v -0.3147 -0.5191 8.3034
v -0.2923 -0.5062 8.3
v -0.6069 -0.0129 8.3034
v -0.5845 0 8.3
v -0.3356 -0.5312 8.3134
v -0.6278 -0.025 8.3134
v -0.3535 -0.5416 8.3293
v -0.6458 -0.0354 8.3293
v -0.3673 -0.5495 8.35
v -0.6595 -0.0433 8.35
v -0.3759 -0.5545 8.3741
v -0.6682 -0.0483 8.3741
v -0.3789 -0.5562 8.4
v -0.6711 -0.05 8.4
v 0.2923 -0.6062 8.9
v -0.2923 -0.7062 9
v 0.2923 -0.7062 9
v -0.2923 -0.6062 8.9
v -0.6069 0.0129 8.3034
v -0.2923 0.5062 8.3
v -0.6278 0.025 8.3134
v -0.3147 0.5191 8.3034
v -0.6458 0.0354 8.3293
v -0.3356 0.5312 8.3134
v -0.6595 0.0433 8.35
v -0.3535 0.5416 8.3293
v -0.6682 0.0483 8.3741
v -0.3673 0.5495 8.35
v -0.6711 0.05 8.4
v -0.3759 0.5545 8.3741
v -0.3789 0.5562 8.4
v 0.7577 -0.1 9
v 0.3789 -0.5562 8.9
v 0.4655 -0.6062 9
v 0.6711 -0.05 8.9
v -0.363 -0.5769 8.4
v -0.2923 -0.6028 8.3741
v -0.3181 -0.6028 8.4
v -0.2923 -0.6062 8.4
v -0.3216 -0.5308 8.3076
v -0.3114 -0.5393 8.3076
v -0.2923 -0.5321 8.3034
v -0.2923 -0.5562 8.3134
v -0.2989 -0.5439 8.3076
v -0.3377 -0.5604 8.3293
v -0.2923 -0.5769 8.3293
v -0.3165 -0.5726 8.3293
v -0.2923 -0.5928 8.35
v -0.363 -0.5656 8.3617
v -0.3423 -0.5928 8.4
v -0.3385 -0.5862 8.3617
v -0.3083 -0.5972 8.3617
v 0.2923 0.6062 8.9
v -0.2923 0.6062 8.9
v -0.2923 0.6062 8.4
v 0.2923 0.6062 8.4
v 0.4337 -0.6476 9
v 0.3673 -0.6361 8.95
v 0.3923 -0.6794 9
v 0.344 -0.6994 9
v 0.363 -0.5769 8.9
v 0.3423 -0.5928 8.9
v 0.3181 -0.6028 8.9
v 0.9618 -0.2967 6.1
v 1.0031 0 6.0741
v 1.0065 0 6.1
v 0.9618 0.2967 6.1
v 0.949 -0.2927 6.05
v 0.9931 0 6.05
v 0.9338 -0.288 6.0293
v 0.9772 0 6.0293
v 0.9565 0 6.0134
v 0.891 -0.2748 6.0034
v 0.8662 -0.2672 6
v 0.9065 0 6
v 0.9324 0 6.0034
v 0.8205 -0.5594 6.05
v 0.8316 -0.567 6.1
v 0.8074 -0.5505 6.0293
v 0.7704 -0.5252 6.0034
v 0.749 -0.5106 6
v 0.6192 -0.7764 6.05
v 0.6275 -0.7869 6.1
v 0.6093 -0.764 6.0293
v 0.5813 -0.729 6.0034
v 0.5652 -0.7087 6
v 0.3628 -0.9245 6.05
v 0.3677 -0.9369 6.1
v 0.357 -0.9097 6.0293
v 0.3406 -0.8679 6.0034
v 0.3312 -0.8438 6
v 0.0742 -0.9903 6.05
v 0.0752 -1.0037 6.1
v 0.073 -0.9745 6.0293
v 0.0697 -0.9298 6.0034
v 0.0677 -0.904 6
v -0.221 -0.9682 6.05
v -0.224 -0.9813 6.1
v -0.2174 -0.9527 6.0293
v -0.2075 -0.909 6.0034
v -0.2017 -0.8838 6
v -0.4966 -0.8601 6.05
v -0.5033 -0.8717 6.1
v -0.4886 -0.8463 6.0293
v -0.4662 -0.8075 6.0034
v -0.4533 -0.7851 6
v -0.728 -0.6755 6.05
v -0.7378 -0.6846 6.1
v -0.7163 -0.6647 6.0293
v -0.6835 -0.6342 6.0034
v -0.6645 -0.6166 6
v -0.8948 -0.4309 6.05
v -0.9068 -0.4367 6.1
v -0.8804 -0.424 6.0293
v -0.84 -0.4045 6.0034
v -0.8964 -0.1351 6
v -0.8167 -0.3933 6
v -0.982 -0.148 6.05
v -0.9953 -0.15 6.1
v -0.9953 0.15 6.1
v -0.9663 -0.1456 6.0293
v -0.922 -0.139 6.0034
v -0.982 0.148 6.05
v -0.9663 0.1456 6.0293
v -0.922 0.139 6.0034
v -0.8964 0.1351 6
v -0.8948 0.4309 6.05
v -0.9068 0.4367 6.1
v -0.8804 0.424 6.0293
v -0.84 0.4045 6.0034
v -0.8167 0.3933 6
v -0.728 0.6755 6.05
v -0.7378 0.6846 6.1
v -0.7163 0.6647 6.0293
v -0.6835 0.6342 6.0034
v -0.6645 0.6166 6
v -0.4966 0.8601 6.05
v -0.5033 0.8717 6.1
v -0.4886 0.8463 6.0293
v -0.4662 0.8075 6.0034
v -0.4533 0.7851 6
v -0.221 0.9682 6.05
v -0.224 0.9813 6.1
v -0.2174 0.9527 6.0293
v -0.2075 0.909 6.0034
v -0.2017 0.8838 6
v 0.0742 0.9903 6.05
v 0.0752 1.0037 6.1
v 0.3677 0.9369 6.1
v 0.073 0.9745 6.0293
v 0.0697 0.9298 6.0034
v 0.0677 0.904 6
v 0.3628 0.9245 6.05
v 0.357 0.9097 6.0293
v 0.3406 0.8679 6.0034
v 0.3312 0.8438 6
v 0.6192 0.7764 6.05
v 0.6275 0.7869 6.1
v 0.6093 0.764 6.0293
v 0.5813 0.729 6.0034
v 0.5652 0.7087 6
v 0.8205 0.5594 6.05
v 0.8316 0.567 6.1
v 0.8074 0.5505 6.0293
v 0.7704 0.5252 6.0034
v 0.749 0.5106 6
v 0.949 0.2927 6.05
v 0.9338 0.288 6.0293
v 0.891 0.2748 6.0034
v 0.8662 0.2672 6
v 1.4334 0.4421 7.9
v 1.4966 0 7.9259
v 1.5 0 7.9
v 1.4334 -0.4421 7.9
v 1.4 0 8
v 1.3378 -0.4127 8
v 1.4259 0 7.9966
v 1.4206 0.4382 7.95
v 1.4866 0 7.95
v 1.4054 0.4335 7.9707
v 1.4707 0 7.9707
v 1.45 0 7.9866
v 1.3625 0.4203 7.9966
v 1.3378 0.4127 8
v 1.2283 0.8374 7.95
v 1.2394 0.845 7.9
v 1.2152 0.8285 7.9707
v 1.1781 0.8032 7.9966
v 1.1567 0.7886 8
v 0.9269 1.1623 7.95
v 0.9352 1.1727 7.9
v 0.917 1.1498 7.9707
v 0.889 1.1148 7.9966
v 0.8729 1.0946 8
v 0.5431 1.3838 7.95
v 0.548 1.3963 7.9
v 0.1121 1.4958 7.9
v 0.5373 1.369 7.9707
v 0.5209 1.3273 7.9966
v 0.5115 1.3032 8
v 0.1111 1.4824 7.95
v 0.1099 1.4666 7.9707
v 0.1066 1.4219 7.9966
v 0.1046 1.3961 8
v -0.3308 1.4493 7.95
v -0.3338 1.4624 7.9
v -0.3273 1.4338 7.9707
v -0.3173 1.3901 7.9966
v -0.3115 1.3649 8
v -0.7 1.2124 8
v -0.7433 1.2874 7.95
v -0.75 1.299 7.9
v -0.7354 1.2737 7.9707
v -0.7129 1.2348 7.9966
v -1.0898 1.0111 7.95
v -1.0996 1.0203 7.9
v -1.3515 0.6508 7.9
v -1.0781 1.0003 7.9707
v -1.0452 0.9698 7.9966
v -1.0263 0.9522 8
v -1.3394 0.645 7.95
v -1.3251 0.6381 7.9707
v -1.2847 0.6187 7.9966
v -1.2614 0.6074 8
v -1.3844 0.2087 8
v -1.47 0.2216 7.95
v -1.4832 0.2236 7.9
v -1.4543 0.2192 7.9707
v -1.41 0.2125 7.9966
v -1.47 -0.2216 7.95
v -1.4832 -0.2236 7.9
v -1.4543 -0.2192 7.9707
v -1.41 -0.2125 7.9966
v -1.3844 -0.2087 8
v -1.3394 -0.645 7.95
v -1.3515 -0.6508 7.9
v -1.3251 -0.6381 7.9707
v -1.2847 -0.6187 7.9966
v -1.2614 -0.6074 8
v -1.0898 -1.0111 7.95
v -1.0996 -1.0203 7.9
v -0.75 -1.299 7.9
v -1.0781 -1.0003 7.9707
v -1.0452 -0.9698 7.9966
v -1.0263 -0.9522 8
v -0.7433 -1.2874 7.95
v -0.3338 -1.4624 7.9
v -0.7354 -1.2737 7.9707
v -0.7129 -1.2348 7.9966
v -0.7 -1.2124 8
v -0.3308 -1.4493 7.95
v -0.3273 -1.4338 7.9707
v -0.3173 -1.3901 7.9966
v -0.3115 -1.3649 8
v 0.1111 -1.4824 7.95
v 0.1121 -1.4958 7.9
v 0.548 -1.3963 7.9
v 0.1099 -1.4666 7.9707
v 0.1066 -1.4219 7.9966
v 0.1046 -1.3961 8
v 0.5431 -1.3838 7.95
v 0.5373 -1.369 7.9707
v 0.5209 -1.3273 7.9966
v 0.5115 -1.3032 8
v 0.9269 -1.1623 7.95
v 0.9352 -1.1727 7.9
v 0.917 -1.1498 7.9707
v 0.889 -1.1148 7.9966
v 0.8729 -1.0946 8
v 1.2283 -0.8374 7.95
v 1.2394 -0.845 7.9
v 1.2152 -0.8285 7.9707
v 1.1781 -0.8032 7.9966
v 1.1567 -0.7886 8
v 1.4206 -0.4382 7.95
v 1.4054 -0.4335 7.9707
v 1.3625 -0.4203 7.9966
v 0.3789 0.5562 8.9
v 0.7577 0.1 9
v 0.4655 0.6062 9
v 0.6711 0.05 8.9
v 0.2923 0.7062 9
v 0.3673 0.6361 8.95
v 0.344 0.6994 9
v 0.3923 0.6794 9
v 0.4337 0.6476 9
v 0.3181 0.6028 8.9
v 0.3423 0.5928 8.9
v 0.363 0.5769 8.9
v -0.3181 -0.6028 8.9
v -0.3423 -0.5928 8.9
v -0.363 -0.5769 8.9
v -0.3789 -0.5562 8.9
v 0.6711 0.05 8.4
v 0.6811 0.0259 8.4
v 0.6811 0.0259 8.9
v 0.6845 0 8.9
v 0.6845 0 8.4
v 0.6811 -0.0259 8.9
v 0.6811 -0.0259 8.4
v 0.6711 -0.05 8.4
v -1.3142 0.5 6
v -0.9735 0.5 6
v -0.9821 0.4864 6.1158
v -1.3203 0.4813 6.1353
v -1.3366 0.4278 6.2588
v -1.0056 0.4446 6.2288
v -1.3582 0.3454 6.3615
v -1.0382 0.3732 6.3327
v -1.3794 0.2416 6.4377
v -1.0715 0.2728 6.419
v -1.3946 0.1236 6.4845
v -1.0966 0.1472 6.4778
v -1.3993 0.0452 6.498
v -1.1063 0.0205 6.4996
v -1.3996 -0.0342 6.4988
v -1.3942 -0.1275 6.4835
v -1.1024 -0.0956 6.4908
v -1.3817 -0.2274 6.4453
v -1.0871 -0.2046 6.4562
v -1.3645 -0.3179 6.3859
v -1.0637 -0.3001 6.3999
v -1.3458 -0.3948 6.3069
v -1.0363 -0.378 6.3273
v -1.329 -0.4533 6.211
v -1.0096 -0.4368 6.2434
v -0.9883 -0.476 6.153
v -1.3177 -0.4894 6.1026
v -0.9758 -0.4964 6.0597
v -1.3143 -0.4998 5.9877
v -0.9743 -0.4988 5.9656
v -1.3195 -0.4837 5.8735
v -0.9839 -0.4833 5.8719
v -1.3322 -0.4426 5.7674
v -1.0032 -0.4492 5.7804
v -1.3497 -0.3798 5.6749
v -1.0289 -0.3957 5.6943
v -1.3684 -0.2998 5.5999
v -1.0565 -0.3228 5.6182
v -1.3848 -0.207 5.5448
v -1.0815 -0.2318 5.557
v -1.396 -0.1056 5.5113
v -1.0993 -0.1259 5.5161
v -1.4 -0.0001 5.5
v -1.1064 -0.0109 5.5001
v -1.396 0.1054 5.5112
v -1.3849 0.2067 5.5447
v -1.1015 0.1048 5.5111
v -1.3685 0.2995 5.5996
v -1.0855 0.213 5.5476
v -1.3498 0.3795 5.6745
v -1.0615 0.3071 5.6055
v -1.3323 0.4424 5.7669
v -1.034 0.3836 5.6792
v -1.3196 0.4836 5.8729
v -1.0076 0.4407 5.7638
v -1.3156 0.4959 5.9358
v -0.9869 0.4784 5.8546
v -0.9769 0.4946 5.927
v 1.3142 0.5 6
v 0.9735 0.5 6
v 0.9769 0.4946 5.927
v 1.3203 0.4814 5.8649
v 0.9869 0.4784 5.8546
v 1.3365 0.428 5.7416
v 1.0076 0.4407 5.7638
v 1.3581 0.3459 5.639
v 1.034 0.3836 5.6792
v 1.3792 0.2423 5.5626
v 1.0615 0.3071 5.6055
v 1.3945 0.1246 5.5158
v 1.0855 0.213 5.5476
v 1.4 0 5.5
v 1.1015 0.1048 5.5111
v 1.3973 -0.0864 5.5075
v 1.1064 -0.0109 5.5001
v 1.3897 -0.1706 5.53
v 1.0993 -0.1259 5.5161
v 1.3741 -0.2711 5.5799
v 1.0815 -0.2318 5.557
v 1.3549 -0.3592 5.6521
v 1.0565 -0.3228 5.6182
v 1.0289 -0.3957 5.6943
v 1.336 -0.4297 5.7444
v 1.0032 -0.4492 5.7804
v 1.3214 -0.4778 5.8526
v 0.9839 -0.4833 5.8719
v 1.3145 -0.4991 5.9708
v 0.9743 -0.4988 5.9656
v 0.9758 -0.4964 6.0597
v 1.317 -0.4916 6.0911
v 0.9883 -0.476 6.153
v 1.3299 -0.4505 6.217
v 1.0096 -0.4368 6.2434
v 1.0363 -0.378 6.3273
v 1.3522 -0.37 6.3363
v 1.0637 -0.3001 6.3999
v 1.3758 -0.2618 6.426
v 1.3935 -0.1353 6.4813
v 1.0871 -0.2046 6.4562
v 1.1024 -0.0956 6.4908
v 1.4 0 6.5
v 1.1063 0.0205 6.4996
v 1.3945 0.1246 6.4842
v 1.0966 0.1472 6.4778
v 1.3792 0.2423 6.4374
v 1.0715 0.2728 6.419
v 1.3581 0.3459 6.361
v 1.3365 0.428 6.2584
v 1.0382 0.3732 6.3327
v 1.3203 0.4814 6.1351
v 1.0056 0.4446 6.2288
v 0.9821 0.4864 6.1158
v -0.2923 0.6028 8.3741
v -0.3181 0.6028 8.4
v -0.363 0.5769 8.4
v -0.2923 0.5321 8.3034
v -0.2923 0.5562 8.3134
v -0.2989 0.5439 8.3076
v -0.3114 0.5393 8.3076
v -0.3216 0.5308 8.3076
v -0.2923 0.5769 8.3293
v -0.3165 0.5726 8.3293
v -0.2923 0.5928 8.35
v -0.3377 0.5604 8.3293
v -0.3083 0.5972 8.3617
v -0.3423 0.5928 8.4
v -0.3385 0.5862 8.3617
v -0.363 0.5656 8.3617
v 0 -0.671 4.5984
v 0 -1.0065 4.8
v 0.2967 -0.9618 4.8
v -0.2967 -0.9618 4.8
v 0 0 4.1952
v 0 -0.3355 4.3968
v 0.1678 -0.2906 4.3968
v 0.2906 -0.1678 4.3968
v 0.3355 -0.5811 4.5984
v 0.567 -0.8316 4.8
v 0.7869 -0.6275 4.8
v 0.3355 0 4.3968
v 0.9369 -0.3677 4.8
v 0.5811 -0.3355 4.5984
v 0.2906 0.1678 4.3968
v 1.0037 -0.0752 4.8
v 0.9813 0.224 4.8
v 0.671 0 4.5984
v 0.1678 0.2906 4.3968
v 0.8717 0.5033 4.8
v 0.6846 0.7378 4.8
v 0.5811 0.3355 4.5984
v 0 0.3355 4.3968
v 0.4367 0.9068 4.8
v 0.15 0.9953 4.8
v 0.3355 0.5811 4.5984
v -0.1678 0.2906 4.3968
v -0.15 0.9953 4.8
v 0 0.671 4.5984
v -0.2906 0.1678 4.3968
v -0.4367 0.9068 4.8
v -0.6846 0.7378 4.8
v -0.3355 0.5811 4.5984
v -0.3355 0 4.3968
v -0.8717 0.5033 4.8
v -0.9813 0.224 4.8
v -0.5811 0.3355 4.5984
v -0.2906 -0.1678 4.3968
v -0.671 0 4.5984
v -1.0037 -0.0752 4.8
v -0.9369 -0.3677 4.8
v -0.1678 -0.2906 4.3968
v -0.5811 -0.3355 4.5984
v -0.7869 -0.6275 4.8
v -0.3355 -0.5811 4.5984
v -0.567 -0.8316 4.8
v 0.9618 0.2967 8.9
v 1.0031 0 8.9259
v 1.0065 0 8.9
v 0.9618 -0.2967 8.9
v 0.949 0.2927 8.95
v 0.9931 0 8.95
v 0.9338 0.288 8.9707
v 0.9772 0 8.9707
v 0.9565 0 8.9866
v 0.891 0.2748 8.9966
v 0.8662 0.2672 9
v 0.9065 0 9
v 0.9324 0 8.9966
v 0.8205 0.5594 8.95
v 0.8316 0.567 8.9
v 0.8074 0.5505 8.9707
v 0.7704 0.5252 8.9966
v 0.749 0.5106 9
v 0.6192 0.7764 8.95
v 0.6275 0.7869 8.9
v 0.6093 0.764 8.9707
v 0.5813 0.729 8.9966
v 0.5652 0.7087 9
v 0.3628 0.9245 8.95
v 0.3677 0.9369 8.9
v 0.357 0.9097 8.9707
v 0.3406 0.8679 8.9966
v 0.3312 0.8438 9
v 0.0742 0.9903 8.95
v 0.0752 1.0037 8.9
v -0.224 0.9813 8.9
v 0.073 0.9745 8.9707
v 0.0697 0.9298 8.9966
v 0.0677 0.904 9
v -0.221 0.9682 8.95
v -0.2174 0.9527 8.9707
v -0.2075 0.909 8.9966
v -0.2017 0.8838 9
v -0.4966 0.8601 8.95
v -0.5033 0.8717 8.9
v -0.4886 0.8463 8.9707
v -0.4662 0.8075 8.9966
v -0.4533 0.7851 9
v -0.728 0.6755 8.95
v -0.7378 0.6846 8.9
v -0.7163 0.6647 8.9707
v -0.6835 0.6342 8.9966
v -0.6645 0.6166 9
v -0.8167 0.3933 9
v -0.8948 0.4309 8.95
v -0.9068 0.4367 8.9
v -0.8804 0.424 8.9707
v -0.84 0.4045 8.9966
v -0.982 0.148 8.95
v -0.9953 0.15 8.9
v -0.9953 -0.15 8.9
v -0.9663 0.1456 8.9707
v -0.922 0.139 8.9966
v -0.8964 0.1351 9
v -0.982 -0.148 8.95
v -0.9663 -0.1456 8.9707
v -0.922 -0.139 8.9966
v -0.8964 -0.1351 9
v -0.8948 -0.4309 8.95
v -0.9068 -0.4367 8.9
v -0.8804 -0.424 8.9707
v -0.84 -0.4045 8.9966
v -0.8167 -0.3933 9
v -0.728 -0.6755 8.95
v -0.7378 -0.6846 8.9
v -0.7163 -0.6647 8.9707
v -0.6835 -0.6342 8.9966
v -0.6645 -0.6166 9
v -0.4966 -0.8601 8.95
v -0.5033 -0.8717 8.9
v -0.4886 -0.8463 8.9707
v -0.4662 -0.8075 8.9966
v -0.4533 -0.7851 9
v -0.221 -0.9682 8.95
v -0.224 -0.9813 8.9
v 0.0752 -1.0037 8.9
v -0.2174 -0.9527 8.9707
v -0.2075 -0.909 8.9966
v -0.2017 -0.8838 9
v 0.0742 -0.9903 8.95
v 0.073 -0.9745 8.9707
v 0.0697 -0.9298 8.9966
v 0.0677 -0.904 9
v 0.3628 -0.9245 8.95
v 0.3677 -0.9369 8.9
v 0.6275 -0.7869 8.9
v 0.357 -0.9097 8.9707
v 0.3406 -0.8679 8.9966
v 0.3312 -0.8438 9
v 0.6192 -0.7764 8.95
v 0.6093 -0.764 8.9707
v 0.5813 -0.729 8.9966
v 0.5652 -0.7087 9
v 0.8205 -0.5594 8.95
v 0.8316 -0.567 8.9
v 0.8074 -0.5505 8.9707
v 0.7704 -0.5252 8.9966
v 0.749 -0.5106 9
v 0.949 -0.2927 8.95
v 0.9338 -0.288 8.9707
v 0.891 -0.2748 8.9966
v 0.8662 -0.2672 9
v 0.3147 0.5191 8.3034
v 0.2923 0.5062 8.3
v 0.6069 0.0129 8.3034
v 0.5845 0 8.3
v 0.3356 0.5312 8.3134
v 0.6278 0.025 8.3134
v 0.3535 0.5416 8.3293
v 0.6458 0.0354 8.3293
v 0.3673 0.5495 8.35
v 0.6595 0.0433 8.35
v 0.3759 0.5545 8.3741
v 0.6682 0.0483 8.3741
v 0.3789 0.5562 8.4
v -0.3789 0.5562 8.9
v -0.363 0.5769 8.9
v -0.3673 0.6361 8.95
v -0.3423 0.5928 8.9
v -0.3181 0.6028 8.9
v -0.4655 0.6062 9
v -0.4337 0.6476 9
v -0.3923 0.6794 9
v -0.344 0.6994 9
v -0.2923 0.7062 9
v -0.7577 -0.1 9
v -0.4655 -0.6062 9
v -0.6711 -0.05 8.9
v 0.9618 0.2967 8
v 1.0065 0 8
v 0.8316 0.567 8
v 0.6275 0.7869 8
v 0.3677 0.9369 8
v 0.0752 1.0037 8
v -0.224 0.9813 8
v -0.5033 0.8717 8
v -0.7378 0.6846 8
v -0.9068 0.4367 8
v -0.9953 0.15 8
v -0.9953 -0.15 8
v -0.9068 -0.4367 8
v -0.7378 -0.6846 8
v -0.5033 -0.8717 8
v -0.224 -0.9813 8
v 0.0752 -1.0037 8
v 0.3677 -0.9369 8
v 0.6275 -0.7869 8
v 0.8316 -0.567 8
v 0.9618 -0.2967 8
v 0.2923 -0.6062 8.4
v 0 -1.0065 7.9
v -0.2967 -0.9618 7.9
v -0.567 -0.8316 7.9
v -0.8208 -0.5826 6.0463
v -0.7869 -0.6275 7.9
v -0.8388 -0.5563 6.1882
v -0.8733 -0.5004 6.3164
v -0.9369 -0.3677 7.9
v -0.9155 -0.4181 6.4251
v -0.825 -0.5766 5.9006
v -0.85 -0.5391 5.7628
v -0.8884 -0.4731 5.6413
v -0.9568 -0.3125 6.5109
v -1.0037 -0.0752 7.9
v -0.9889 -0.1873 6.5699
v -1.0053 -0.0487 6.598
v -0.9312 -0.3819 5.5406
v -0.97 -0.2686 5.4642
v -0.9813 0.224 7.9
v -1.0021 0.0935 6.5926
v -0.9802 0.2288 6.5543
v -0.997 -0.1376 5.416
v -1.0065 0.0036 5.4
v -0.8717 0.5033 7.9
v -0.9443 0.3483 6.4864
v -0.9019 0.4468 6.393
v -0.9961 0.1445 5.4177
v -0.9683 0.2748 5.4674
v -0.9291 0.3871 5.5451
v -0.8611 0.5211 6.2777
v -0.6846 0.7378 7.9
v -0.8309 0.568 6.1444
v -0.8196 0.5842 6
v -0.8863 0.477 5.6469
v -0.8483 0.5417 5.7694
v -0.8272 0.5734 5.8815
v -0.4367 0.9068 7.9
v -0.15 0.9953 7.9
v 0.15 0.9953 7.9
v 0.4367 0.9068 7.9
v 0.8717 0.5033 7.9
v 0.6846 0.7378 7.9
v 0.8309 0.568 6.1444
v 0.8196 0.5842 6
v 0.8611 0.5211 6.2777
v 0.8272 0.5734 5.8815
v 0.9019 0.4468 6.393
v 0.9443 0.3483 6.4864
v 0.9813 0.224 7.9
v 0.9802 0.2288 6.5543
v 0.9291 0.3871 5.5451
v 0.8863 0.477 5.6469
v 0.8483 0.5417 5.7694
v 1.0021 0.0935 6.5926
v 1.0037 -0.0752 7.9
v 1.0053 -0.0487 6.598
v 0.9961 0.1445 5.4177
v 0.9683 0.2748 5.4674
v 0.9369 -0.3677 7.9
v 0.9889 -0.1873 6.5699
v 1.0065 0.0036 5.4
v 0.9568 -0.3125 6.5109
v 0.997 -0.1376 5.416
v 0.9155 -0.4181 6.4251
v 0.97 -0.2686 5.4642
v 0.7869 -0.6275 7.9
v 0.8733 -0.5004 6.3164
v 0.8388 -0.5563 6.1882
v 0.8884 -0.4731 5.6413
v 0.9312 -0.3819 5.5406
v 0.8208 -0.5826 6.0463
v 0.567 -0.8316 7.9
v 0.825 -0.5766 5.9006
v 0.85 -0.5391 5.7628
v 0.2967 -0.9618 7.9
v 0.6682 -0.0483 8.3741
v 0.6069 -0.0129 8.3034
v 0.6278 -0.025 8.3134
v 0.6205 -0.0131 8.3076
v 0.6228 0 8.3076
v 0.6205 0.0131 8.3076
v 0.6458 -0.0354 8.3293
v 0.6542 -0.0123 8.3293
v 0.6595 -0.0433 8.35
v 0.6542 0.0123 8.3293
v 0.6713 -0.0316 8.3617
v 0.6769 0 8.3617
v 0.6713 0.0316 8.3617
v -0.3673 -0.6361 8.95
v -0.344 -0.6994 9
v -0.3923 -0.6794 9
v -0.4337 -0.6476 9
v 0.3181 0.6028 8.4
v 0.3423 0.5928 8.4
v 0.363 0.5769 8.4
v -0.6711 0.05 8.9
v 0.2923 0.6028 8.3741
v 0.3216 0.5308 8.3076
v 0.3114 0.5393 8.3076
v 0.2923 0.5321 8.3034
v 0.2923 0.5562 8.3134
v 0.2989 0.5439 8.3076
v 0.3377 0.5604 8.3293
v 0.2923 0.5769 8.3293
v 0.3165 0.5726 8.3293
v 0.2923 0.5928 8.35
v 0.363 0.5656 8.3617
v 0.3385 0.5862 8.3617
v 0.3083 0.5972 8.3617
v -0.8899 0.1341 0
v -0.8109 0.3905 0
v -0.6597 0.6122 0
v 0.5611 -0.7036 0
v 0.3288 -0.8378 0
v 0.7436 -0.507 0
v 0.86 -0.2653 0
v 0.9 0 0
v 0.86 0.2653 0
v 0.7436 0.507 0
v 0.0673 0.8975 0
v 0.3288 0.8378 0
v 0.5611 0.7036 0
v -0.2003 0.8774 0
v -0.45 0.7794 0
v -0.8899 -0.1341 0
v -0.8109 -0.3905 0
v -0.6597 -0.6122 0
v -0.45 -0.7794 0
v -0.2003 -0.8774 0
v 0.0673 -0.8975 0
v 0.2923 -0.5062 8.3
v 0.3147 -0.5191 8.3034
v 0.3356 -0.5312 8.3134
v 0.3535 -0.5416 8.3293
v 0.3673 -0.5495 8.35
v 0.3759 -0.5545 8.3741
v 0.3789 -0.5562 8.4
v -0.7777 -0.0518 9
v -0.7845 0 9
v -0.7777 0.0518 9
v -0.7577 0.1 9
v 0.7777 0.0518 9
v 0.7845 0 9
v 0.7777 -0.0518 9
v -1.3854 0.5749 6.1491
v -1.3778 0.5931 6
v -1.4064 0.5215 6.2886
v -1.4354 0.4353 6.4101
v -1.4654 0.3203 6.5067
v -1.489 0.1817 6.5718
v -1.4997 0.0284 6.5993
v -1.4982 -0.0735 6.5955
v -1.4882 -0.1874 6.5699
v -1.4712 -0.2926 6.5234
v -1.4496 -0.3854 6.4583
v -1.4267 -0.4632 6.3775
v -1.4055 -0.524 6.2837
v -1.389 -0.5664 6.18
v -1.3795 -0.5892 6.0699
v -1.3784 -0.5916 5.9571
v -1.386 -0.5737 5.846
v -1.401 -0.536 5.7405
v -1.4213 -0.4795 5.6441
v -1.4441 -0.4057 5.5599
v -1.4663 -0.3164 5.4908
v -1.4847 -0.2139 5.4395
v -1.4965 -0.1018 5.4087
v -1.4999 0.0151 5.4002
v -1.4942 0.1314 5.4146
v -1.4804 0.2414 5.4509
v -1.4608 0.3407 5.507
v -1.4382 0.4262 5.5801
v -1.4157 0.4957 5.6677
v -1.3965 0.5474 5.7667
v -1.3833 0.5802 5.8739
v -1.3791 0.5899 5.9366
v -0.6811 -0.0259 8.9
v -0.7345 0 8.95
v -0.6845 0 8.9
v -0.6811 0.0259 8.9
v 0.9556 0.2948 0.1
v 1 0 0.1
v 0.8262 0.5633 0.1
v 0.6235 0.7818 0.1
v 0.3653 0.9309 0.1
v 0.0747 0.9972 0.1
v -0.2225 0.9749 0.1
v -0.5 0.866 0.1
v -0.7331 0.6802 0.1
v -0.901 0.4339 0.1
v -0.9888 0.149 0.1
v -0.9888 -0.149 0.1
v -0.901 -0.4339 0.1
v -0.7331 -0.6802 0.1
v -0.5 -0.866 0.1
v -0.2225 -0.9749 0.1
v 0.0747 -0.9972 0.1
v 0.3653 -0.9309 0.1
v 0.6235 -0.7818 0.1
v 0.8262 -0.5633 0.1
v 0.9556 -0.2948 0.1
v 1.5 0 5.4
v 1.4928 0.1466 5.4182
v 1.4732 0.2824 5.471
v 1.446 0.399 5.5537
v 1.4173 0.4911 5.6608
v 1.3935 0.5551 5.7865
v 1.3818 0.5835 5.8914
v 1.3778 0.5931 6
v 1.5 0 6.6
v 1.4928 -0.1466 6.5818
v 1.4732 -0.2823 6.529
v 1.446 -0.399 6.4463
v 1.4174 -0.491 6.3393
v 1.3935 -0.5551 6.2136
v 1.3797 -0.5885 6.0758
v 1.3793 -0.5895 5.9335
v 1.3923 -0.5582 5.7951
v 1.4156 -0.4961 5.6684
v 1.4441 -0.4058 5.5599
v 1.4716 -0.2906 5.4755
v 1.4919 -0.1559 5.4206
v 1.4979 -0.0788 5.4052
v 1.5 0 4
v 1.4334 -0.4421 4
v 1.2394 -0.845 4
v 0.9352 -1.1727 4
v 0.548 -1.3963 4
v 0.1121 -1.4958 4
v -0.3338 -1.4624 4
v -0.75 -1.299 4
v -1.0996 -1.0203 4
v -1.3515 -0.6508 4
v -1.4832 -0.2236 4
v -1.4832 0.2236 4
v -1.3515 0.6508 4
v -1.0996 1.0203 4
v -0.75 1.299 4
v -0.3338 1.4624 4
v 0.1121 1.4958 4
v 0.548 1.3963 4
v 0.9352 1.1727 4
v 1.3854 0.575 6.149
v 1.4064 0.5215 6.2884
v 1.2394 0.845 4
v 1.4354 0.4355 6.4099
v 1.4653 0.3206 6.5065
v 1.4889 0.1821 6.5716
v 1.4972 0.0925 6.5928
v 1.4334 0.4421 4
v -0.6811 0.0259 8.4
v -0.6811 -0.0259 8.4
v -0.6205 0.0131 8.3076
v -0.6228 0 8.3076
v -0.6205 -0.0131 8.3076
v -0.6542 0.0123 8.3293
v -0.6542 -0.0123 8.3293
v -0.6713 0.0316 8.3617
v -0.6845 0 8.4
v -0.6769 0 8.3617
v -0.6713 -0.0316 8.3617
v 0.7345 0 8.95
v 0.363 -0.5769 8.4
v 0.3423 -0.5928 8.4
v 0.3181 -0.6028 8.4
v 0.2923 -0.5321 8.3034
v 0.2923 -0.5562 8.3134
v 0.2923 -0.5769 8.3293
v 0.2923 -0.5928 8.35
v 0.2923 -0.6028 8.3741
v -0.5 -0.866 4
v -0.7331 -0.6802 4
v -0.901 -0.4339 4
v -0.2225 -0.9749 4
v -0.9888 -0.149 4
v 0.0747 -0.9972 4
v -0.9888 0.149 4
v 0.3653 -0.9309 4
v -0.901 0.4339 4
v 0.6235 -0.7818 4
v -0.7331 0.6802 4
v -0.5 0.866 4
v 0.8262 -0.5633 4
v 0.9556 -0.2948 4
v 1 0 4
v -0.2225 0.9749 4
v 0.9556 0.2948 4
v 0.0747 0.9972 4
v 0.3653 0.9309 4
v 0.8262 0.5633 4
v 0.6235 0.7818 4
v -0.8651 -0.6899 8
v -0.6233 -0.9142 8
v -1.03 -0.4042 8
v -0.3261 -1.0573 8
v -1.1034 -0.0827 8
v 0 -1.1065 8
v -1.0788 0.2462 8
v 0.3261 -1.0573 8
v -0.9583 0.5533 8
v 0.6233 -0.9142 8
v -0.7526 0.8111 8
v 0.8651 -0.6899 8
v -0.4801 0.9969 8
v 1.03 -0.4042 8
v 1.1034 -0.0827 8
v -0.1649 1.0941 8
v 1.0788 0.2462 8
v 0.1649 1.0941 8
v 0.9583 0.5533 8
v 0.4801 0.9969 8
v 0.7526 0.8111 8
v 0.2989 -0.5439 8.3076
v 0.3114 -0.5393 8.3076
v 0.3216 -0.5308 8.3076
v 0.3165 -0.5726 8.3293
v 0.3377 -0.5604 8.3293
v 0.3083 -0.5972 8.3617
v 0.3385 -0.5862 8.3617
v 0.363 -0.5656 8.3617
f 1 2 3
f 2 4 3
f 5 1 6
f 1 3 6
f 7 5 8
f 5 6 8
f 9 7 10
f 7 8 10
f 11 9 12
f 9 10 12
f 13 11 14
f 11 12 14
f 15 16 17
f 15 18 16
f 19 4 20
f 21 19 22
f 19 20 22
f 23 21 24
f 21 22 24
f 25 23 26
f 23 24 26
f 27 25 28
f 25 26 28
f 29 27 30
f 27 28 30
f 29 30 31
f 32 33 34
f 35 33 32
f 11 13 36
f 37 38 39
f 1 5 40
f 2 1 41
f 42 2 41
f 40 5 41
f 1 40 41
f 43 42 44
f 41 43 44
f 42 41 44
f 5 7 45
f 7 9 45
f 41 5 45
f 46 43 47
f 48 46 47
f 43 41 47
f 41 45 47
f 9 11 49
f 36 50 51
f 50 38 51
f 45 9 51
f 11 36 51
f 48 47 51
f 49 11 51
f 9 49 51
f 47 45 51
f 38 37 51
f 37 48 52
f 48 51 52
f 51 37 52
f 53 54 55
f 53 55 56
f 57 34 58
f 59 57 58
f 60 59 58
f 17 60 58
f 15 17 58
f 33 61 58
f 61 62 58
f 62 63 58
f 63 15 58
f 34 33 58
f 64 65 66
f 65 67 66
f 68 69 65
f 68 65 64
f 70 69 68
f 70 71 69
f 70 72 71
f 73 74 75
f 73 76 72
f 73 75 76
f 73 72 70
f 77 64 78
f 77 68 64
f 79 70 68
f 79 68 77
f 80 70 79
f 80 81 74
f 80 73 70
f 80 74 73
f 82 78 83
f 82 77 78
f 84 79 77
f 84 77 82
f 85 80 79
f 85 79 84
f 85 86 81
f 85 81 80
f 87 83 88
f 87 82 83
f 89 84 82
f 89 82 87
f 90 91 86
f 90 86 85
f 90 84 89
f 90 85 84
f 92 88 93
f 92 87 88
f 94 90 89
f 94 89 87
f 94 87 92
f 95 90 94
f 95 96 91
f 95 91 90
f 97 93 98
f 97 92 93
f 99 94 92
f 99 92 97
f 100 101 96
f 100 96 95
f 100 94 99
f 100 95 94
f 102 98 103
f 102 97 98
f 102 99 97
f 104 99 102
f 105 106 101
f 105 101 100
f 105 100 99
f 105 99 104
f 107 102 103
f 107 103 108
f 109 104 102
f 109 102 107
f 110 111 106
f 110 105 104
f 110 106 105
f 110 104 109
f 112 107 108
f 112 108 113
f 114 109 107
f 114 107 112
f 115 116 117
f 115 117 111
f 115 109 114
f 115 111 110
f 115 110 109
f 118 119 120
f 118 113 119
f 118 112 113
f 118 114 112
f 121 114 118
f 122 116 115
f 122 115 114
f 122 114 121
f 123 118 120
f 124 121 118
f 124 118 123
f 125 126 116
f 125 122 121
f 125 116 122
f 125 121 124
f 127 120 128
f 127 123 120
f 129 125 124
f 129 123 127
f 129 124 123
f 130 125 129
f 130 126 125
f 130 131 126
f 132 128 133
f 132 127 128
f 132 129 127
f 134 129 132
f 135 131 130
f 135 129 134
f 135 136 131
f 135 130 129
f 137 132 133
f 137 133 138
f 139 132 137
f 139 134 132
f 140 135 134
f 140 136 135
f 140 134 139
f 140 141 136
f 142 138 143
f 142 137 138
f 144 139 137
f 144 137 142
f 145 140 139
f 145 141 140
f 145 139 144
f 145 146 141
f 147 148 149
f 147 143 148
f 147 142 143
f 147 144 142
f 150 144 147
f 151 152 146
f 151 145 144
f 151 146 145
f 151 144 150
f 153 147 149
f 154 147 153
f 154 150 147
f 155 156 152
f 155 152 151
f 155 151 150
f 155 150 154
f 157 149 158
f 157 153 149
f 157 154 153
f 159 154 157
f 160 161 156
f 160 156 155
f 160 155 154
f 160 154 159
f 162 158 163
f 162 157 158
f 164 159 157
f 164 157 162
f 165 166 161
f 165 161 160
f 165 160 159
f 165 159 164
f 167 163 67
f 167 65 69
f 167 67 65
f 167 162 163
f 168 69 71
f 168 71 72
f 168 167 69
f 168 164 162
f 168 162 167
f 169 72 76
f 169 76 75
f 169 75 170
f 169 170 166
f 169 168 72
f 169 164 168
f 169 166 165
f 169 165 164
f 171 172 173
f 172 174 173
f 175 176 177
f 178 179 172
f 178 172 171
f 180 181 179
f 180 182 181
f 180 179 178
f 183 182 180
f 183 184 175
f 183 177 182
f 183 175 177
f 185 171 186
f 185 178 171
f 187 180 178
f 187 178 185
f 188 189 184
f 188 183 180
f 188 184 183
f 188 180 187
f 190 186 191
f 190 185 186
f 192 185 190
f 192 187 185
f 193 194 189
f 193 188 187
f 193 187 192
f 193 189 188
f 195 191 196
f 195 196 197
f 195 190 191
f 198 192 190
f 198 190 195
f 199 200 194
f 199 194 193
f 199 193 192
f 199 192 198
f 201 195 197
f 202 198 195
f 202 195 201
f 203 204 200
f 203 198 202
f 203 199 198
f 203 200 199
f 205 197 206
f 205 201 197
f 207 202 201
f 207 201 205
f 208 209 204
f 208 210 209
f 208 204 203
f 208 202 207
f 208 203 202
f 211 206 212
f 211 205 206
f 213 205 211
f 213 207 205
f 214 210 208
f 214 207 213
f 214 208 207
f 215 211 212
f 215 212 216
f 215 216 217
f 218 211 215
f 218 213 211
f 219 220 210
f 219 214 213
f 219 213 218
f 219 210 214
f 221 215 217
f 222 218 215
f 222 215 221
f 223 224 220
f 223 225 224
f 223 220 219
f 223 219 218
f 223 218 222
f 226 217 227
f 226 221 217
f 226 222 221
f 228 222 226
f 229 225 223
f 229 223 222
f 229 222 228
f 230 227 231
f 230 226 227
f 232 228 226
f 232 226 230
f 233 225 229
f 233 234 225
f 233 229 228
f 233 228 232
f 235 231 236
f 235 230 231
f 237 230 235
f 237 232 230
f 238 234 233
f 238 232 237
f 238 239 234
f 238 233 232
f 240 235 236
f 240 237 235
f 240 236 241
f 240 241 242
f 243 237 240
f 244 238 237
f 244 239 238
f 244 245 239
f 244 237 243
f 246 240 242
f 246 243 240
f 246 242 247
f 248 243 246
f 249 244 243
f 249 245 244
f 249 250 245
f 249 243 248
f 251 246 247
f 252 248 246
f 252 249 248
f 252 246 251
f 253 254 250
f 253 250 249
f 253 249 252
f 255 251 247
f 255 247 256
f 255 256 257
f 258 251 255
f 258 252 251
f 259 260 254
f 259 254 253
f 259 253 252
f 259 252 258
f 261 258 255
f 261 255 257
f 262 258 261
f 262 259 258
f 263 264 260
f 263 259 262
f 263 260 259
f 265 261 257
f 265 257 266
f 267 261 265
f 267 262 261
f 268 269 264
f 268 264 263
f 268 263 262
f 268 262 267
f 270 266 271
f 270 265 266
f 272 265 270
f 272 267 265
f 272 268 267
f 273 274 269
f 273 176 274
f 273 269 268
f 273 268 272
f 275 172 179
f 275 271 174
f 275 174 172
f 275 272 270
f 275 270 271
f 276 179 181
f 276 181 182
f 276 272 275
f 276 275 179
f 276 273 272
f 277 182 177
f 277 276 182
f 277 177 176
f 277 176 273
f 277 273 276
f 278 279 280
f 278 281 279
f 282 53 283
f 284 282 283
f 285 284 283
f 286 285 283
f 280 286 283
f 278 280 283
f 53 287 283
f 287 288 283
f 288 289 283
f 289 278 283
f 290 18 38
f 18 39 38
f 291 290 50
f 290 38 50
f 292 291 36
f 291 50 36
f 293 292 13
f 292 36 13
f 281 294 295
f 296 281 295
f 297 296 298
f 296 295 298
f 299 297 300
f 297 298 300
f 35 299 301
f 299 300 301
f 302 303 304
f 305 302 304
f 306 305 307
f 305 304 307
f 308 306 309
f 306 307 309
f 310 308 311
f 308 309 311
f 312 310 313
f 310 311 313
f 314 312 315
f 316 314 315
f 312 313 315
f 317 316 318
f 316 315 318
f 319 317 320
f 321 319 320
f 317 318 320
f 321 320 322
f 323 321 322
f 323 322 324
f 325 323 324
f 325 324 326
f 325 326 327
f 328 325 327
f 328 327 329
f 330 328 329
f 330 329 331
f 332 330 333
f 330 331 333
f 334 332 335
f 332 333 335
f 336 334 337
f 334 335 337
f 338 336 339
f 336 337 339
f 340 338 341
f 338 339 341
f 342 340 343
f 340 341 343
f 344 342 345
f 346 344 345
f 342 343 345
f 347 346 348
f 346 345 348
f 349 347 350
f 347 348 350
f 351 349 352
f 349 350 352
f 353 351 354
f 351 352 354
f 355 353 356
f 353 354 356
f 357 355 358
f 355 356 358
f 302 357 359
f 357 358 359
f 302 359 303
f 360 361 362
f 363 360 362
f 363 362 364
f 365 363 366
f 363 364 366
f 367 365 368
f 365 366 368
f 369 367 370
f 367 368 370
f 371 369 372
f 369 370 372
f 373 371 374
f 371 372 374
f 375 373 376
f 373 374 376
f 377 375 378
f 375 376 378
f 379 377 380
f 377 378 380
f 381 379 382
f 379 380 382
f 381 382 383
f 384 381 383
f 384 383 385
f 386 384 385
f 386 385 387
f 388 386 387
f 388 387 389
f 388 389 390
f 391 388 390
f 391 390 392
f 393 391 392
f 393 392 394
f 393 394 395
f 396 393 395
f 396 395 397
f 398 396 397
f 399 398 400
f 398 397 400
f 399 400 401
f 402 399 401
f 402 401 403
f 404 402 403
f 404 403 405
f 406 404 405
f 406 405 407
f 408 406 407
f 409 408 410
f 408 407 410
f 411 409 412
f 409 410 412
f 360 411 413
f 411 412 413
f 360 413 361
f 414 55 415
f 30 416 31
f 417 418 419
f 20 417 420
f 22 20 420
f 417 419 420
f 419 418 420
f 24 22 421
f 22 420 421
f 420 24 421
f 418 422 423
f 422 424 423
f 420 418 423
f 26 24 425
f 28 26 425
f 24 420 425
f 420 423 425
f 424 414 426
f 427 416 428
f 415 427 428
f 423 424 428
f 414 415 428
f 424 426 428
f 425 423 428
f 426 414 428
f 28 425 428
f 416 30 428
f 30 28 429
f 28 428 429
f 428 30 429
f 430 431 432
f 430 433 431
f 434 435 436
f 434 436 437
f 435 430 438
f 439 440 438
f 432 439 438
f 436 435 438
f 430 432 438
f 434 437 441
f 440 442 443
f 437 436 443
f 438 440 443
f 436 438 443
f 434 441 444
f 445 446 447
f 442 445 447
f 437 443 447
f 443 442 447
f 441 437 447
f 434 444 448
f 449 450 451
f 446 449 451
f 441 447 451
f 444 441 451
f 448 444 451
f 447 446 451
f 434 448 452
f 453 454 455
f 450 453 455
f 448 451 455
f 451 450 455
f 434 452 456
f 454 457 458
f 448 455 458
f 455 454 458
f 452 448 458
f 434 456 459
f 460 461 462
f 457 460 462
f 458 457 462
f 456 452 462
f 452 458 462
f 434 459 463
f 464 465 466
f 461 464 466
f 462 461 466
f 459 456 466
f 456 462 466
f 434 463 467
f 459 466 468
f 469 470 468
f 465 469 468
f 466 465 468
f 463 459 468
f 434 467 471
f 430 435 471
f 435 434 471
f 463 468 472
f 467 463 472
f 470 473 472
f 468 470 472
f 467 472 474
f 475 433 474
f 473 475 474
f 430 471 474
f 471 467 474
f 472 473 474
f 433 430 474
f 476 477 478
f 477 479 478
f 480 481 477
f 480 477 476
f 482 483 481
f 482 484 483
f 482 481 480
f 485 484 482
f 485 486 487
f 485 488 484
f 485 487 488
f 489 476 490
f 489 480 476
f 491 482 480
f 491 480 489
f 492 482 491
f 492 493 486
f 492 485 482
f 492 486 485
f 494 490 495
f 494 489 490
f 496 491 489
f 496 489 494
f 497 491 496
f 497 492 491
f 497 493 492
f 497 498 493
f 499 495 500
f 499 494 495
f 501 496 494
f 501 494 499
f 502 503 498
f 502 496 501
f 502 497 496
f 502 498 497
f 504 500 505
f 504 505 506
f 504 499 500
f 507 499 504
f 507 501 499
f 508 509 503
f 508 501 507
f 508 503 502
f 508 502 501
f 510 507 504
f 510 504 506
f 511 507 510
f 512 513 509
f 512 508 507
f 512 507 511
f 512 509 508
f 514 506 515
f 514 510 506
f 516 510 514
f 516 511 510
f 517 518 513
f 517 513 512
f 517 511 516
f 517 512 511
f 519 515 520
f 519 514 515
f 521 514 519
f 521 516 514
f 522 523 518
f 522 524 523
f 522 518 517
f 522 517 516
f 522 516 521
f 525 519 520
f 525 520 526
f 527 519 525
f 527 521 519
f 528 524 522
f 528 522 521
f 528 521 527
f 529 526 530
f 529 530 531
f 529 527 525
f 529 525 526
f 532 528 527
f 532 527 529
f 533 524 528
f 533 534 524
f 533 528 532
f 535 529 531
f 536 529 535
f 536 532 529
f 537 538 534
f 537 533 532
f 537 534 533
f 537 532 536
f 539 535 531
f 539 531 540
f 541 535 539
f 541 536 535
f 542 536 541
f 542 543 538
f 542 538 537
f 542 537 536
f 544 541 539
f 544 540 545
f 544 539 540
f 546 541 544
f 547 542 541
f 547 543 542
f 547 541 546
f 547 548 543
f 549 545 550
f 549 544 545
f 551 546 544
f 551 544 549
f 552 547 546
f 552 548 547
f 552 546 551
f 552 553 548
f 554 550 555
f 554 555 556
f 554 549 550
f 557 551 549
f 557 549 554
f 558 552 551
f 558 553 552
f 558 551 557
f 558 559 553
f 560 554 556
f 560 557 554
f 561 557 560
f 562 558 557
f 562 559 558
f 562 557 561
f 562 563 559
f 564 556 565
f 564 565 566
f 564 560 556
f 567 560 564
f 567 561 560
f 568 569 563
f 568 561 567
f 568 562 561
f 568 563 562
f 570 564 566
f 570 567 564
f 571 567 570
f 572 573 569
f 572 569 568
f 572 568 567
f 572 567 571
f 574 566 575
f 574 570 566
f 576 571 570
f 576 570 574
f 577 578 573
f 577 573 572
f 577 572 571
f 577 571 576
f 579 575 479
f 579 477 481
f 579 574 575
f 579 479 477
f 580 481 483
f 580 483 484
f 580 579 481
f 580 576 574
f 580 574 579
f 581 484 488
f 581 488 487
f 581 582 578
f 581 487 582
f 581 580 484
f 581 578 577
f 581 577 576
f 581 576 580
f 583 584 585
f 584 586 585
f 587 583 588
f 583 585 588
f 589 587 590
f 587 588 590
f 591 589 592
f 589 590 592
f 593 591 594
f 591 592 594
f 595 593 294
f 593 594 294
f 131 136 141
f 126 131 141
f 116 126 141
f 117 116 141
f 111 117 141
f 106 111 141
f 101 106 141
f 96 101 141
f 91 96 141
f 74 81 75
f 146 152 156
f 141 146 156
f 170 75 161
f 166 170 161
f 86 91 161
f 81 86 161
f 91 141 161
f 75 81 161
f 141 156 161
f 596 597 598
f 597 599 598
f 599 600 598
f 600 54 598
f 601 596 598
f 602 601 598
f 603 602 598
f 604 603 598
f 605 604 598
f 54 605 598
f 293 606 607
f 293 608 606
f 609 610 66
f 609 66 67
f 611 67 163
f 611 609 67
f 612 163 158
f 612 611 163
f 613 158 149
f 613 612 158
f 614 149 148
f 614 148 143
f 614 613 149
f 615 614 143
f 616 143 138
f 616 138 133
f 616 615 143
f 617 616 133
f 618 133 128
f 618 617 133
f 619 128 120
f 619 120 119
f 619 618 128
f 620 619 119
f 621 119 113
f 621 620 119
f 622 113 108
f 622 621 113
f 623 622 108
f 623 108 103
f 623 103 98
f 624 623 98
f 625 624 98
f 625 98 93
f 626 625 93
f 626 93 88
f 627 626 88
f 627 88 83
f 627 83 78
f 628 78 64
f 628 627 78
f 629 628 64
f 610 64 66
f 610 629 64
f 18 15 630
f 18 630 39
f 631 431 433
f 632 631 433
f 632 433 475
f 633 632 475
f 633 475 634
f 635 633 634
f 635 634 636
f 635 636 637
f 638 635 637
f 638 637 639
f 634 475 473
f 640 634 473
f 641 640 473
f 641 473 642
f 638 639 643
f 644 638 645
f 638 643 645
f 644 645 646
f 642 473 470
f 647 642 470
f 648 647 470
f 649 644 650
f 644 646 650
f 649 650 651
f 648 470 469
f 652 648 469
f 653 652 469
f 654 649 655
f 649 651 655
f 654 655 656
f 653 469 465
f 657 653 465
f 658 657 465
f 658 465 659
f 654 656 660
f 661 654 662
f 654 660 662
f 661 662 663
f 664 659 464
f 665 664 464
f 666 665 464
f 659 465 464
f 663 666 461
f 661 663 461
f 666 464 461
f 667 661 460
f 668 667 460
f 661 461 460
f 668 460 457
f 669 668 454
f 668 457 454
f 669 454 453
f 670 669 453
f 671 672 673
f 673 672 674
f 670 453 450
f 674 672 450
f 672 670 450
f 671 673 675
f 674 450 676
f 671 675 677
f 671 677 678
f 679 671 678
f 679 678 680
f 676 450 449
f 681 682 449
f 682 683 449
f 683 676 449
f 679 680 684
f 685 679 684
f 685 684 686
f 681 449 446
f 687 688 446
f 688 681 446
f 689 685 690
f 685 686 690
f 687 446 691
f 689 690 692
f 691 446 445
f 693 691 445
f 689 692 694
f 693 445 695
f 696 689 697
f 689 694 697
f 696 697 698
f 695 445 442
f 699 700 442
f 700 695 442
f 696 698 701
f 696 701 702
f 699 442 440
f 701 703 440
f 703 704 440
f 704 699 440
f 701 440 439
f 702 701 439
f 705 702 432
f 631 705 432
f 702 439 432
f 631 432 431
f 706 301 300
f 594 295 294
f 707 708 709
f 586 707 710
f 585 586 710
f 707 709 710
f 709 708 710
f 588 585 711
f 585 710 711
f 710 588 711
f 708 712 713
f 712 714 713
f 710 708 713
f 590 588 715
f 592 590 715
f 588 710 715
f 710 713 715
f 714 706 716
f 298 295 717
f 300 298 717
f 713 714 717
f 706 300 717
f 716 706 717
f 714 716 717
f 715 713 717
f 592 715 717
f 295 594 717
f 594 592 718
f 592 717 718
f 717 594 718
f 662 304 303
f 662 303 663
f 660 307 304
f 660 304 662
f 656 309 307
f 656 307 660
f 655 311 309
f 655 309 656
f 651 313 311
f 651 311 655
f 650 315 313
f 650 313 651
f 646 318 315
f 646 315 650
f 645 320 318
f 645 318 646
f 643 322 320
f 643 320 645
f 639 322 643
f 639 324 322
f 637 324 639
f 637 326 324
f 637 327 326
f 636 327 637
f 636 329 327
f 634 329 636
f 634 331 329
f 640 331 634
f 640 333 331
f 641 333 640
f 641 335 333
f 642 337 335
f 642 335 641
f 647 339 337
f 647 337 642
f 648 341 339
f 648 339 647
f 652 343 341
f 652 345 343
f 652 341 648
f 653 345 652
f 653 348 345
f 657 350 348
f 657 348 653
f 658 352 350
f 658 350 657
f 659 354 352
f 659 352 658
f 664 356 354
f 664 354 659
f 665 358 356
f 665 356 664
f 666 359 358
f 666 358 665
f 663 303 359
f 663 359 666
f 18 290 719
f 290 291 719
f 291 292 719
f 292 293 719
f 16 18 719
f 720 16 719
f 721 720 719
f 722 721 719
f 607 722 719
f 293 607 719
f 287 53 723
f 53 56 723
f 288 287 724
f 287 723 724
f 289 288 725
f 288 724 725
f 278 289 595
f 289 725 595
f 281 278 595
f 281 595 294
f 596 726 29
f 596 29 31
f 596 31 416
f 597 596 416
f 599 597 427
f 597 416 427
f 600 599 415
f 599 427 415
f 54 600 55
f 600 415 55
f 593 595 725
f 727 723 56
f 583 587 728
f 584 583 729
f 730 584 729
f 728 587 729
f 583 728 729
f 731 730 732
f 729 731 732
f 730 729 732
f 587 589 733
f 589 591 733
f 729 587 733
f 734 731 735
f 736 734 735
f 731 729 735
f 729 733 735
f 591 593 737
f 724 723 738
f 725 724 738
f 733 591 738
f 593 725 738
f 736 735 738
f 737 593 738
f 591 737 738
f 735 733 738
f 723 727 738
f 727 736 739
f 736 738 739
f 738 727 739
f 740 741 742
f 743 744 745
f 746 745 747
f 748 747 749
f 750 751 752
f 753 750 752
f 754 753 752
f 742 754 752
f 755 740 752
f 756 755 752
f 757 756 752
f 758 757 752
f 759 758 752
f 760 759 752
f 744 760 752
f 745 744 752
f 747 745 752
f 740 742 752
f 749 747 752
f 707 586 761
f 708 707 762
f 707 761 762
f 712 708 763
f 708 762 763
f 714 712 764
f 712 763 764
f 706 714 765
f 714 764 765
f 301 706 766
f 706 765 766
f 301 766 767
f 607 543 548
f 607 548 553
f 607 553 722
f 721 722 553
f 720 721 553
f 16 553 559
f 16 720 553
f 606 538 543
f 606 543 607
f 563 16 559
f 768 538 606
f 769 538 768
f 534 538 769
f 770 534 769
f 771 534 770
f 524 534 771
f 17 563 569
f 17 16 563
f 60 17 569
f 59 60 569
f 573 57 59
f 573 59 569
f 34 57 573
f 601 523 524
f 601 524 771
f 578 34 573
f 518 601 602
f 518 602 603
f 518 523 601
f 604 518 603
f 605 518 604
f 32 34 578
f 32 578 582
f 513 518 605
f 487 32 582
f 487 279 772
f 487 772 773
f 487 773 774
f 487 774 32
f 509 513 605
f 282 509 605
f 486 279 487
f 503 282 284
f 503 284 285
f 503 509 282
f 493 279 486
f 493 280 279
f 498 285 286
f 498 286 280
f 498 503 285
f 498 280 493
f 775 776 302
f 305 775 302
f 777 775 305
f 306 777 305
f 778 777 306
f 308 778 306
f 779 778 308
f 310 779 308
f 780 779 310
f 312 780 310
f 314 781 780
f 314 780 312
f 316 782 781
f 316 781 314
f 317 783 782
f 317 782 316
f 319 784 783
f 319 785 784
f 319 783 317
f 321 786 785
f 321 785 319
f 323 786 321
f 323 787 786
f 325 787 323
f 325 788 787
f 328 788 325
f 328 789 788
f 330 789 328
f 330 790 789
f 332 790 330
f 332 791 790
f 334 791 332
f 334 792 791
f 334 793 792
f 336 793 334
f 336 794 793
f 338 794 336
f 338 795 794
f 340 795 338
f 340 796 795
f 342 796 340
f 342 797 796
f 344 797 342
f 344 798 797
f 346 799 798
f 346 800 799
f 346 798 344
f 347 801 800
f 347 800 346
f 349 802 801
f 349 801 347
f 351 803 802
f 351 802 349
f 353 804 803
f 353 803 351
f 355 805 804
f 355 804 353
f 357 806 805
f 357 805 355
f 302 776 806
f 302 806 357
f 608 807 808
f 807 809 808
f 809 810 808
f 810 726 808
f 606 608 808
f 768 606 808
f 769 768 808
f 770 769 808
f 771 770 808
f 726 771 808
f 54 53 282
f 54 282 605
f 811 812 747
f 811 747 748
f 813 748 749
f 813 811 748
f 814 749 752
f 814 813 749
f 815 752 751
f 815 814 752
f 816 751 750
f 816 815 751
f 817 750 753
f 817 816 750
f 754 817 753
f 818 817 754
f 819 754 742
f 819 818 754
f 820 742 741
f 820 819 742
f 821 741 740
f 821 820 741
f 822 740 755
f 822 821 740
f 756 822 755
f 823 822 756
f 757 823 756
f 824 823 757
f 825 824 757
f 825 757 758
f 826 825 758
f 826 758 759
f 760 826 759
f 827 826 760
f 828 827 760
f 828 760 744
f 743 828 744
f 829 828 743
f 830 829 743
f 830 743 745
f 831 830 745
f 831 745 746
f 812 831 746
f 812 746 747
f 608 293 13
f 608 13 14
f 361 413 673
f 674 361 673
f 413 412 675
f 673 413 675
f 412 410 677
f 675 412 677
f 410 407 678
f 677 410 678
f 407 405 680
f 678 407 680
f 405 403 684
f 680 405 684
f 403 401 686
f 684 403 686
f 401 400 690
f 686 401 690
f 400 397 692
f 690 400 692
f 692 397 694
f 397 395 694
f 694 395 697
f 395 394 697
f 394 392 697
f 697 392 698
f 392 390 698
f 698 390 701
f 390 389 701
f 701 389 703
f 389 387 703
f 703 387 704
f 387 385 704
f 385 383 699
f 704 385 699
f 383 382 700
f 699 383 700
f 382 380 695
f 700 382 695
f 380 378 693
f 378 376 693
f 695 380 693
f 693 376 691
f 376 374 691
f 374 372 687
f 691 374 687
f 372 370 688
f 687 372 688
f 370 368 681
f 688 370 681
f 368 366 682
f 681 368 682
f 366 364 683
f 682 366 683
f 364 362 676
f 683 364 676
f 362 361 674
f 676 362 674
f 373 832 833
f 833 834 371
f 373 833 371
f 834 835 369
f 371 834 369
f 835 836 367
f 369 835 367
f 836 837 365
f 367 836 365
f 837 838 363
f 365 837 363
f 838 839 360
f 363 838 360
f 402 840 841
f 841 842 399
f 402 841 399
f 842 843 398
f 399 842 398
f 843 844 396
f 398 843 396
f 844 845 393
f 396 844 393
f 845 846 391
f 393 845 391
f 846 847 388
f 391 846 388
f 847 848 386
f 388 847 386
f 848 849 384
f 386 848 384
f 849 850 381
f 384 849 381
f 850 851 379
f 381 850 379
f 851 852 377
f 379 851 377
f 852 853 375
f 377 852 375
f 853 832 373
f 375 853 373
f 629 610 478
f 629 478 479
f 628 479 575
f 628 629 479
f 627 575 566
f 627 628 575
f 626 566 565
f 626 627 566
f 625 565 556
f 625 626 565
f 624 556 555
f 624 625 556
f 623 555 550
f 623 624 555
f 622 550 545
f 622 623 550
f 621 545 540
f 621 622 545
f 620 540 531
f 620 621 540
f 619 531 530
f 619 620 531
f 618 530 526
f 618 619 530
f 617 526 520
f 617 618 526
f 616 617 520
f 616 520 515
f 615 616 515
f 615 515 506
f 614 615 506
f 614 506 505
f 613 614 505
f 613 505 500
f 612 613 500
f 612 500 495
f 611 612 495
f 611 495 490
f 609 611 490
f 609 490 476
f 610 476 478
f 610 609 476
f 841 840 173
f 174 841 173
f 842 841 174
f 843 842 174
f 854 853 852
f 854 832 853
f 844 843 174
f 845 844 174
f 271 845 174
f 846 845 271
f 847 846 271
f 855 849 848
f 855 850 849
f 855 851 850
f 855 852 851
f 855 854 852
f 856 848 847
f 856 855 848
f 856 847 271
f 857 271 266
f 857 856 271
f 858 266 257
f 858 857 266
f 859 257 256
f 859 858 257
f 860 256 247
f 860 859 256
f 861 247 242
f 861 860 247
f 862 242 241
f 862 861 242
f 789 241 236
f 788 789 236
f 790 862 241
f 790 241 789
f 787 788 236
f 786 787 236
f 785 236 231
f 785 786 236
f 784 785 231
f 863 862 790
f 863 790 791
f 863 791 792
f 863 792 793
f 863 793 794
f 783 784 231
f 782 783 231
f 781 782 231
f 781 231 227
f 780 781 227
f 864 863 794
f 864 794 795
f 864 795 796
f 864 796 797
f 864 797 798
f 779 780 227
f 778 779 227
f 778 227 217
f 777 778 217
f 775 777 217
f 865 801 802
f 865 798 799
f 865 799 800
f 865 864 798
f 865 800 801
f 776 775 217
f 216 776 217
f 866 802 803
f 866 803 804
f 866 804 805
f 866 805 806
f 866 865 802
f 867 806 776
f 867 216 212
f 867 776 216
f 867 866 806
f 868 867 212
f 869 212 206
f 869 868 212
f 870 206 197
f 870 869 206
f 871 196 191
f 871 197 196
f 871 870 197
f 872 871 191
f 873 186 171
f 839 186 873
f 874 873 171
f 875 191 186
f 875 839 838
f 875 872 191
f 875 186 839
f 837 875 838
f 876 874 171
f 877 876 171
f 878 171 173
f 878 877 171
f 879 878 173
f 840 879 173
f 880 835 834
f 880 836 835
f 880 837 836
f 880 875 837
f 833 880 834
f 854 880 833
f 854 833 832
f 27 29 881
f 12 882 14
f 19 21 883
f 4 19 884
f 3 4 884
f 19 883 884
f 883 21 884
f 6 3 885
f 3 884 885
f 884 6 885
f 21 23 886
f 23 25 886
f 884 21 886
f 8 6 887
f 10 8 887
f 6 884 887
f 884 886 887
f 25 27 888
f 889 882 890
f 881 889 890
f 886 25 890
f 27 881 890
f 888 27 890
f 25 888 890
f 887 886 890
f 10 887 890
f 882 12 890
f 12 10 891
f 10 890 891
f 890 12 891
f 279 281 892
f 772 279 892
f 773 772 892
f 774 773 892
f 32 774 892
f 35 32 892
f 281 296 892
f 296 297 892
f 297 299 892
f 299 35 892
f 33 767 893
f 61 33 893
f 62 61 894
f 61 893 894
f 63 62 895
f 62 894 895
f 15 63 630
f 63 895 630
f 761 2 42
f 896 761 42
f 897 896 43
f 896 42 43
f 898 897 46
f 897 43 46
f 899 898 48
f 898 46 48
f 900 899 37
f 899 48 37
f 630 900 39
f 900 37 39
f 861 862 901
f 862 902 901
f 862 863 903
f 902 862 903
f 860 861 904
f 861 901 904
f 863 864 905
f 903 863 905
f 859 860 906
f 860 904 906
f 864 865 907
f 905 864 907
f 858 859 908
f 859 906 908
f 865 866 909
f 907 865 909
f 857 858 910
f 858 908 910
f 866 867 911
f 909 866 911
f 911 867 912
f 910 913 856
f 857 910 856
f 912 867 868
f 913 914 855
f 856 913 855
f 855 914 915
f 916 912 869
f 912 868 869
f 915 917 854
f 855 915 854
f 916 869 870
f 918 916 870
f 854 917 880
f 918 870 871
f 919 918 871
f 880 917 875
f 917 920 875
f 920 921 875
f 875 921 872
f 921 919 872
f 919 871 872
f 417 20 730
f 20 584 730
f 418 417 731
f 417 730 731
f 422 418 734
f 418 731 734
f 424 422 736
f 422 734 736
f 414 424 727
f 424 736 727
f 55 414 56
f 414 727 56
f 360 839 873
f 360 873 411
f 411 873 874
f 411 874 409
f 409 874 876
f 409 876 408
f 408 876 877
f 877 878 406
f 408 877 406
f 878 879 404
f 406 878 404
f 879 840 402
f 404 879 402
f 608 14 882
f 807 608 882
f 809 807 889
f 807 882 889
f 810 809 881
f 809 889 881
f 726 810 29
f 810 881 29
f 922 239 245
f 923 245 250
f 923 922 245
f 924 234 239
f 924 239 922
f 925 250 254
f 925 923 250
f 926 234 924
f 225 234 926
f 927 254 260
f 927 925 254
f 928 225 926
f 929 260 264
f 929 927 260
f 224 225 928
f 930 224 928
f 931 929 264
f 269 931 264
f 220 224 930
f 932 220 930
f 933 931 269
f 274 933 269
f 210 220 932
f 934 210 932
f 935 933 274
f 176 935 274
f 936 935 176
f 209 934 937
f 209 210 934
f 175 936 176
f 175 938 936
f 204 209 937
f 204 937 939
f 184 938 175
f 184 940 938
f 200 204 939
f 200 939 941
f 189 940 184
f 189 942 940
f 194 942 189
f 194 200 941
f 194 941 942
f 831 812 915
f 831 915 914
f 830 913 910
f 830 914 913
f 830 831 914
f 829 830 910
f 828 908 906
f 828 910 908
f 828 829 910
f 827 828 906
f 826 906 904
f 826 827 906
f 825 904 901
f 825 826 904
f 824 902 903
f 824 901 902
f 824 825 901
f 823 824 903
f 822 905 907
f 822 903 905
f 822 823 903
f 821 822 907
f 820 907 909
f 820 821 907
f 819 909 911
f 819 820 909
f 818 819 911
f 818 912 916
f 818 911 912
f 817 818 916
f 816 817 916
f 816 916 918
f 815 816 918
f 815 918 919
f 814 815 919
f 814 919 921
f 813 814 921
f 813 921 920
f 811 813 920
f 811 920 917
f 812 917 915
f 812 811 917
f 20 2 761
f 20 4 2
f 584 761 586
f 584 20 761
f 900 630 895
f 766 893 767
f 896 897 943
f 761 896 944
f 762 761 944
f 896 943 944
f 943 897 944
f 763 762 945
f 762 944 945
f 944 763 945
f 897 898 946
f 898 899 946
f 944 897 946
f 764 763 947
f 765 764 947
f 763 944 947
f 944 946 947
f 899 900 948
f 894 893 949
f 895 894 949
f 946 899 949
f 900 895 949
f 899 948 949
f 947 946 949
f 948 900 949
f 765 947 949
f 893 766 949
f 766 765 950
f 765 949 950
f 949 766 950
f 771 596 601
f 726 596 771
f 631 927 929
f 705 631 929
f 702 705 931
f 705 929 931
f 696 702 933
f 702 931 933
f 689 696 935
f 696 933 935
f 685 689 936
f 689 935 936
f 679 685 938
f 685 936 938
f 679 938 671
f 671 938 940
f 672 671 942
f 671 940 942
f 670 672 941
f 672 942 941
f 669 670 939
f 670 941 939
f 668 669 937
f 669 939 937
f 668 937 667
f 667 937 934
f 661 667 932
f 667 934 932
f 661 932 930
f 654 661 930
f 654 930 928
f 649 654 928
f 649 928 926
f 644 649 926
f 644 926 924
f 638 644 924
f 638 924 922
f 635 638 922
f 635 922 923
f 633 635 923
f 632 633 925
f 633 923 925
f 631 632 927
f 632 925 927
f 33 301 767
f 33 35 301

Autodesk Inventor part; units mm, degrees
ref_plane "YZ Plane" through (0, 0, 0) normal (1, 0, 0) x (0, 1, 0)
ref_plane "XZ Plane" through (0, 0, 0) normal (0, 1, 0) x (-1, 0, 0)
ref_plane "XY Plane" through (0, 0, 0) normal (0, 0, 1) x (1, 0, 0)
sketch "Sketch1" plane through (0, 0, 0) normal (0, 0, 1) x (1, 0, 0)
  circle A0 centre (0, 0) radius 1
  dimension "d0" = 2
extrude "Extrusion1" add sketch "Sketch1" along normal blind 4
sketch "Sketch2" plane through (0, 0, 4) normal (0, 0, 1) x (1, 0, 0)
  circle A0 centre (0, 0) radius 1.5
  dimension "d3" = 3
extrude "Extrusion2" add sketch "Sketch2" along normal blind 4
fillet "Fillet1" radius 0.1 1 edges at (-1.5, 0, 8)
sketch "Sketch3" plane through (0, 0, 0) normal (1, 0, 0) x (0, 1, 0)
  circle A0 centre (0, 6) radius 0.5
  line L0 (1.5, 7.9) -> (-1.5, 7.9) projected
  point P0 (0, 0)
  point P1 (-1.5, 4.1)
  point P2 (1.5, 4.1)
  dimension "d12" = 1.9
  dimension "d14" = 1
extrude "Extrusion3" cut sketch "Sketch3" along normal through all both and the other way through all
sketch "Sketch4" plane through (0, 0, 8) normal (0, 0, 1) x (1, 0, 0)
  point P0 (0, 0)
  point P1 (0, 0)
hole "Hole1" at (0, 0, 8) direction (0, 0, -1) diameter 2.013 depth 3.2 tip angle 118 thread size "M2.5x0.45" class "6H" standard "ISO Metric profile"
chamfer "Chamfer2" distance 0.1 angle 45 8 edges at (-1, 0, 0) (1.4142, -0.5, 6) (1.4567, 0.3579, 6.3491) (1.4567, 0.3579, 5.6509) (-1.4142, -0.5, 6) (0.8735, -0.5, 6) (-0.8735, -0.5, 6) (0, 1.0065, 8)
sketch "Sketch5" plane through (0, 0, 8) normal (0, 0, 1) x (1, 0, 0)
  circle A0 centre (0, 0) radius 1.0065 projected
extrude "Extrusion4" add sketch "Sketch5" along normal blind 1 and the other way blind 2 separate body
thread "Thread3" size "M2.2x0.45" class "6g" standard "ANSI Metric M Profile" full length
sketch "Sketch6" plane through (0, 0, 9) normal (0, 0, 1) x (1, 0, 0)
  line L0 (-0.35, 0.6062) -> (0.35, 0.6062)
  line L1 (0.35, 0.6062) -> (0.7, 0)
  line L2 (0.7, 0) -> (0.35, -0.6062)
  line L3 (0.35, -0.6062) -> (-0.35, -0.6062)
  line L4 (-0.35, -0.6062) -> (-0.7, 0)
  line L5 (-0.7, 0) -> (-0.35, 0.6062)
  circle A0 centre (0, 0) radius 1.0065 projected
  point P0 (0, 0.6062)
  dimension "d36" = 120
  dimension "d37" = 120
  dimension "d38" = 0.7
extrude "Extrusion5" cut sketch "Sketch6" against normal blind 0.7 contours L0 L1 L2 L3 L4 L5 bodies 2
fillet "Fillet3" radius 0.1 14 edges at (0.35, 0.6062, 8.65) (-0.35, 0.6062, 8.65) (-0.7, 0, 8.65) (-0.35, -0.6062, 8.65) (0.35, -0.6062, 8.65) (0.7, 0, 8.65) (-1.0065, 0, 9) (-1.0065, 0, 6) (-0.525, -0.3031, 8.3) (-0.525, 0.3031, 8.3) (0, 0.6062, 8.3) (0.525, 0.3031, 8.3) (0.525, -0.3031, 8.3) (0, -0.6062, 8.3)
chamfer "Chamfer3" distance 0.1 angle 45 12 edges at (0, 0.6062, 9) (0.3423, 0.5928, 9) (0.525, 0.3031, 9) (0.6845, 0, 9) (0.525, -0.3031, 9) (0.3423, -0.5928, 9) (0, -0.6062, 9) (-0.3423, -0.5928, 9) (-0.525, -0.3031, 9) (-0.6845, 0, 9) (-0.525, 0.3031, 9) (-0.3423, 0.5928, 9)
thread "Thread4" size "M2x0.4" class "6g" standard "ANSI Metric M Profile" length 3
equation "\"d12\" = d13"
equation "\"d37\" = d36"
equation "\"d13\" = 1.9"
properties part number "C-04-0" material "Brass, Soft Yellow"
